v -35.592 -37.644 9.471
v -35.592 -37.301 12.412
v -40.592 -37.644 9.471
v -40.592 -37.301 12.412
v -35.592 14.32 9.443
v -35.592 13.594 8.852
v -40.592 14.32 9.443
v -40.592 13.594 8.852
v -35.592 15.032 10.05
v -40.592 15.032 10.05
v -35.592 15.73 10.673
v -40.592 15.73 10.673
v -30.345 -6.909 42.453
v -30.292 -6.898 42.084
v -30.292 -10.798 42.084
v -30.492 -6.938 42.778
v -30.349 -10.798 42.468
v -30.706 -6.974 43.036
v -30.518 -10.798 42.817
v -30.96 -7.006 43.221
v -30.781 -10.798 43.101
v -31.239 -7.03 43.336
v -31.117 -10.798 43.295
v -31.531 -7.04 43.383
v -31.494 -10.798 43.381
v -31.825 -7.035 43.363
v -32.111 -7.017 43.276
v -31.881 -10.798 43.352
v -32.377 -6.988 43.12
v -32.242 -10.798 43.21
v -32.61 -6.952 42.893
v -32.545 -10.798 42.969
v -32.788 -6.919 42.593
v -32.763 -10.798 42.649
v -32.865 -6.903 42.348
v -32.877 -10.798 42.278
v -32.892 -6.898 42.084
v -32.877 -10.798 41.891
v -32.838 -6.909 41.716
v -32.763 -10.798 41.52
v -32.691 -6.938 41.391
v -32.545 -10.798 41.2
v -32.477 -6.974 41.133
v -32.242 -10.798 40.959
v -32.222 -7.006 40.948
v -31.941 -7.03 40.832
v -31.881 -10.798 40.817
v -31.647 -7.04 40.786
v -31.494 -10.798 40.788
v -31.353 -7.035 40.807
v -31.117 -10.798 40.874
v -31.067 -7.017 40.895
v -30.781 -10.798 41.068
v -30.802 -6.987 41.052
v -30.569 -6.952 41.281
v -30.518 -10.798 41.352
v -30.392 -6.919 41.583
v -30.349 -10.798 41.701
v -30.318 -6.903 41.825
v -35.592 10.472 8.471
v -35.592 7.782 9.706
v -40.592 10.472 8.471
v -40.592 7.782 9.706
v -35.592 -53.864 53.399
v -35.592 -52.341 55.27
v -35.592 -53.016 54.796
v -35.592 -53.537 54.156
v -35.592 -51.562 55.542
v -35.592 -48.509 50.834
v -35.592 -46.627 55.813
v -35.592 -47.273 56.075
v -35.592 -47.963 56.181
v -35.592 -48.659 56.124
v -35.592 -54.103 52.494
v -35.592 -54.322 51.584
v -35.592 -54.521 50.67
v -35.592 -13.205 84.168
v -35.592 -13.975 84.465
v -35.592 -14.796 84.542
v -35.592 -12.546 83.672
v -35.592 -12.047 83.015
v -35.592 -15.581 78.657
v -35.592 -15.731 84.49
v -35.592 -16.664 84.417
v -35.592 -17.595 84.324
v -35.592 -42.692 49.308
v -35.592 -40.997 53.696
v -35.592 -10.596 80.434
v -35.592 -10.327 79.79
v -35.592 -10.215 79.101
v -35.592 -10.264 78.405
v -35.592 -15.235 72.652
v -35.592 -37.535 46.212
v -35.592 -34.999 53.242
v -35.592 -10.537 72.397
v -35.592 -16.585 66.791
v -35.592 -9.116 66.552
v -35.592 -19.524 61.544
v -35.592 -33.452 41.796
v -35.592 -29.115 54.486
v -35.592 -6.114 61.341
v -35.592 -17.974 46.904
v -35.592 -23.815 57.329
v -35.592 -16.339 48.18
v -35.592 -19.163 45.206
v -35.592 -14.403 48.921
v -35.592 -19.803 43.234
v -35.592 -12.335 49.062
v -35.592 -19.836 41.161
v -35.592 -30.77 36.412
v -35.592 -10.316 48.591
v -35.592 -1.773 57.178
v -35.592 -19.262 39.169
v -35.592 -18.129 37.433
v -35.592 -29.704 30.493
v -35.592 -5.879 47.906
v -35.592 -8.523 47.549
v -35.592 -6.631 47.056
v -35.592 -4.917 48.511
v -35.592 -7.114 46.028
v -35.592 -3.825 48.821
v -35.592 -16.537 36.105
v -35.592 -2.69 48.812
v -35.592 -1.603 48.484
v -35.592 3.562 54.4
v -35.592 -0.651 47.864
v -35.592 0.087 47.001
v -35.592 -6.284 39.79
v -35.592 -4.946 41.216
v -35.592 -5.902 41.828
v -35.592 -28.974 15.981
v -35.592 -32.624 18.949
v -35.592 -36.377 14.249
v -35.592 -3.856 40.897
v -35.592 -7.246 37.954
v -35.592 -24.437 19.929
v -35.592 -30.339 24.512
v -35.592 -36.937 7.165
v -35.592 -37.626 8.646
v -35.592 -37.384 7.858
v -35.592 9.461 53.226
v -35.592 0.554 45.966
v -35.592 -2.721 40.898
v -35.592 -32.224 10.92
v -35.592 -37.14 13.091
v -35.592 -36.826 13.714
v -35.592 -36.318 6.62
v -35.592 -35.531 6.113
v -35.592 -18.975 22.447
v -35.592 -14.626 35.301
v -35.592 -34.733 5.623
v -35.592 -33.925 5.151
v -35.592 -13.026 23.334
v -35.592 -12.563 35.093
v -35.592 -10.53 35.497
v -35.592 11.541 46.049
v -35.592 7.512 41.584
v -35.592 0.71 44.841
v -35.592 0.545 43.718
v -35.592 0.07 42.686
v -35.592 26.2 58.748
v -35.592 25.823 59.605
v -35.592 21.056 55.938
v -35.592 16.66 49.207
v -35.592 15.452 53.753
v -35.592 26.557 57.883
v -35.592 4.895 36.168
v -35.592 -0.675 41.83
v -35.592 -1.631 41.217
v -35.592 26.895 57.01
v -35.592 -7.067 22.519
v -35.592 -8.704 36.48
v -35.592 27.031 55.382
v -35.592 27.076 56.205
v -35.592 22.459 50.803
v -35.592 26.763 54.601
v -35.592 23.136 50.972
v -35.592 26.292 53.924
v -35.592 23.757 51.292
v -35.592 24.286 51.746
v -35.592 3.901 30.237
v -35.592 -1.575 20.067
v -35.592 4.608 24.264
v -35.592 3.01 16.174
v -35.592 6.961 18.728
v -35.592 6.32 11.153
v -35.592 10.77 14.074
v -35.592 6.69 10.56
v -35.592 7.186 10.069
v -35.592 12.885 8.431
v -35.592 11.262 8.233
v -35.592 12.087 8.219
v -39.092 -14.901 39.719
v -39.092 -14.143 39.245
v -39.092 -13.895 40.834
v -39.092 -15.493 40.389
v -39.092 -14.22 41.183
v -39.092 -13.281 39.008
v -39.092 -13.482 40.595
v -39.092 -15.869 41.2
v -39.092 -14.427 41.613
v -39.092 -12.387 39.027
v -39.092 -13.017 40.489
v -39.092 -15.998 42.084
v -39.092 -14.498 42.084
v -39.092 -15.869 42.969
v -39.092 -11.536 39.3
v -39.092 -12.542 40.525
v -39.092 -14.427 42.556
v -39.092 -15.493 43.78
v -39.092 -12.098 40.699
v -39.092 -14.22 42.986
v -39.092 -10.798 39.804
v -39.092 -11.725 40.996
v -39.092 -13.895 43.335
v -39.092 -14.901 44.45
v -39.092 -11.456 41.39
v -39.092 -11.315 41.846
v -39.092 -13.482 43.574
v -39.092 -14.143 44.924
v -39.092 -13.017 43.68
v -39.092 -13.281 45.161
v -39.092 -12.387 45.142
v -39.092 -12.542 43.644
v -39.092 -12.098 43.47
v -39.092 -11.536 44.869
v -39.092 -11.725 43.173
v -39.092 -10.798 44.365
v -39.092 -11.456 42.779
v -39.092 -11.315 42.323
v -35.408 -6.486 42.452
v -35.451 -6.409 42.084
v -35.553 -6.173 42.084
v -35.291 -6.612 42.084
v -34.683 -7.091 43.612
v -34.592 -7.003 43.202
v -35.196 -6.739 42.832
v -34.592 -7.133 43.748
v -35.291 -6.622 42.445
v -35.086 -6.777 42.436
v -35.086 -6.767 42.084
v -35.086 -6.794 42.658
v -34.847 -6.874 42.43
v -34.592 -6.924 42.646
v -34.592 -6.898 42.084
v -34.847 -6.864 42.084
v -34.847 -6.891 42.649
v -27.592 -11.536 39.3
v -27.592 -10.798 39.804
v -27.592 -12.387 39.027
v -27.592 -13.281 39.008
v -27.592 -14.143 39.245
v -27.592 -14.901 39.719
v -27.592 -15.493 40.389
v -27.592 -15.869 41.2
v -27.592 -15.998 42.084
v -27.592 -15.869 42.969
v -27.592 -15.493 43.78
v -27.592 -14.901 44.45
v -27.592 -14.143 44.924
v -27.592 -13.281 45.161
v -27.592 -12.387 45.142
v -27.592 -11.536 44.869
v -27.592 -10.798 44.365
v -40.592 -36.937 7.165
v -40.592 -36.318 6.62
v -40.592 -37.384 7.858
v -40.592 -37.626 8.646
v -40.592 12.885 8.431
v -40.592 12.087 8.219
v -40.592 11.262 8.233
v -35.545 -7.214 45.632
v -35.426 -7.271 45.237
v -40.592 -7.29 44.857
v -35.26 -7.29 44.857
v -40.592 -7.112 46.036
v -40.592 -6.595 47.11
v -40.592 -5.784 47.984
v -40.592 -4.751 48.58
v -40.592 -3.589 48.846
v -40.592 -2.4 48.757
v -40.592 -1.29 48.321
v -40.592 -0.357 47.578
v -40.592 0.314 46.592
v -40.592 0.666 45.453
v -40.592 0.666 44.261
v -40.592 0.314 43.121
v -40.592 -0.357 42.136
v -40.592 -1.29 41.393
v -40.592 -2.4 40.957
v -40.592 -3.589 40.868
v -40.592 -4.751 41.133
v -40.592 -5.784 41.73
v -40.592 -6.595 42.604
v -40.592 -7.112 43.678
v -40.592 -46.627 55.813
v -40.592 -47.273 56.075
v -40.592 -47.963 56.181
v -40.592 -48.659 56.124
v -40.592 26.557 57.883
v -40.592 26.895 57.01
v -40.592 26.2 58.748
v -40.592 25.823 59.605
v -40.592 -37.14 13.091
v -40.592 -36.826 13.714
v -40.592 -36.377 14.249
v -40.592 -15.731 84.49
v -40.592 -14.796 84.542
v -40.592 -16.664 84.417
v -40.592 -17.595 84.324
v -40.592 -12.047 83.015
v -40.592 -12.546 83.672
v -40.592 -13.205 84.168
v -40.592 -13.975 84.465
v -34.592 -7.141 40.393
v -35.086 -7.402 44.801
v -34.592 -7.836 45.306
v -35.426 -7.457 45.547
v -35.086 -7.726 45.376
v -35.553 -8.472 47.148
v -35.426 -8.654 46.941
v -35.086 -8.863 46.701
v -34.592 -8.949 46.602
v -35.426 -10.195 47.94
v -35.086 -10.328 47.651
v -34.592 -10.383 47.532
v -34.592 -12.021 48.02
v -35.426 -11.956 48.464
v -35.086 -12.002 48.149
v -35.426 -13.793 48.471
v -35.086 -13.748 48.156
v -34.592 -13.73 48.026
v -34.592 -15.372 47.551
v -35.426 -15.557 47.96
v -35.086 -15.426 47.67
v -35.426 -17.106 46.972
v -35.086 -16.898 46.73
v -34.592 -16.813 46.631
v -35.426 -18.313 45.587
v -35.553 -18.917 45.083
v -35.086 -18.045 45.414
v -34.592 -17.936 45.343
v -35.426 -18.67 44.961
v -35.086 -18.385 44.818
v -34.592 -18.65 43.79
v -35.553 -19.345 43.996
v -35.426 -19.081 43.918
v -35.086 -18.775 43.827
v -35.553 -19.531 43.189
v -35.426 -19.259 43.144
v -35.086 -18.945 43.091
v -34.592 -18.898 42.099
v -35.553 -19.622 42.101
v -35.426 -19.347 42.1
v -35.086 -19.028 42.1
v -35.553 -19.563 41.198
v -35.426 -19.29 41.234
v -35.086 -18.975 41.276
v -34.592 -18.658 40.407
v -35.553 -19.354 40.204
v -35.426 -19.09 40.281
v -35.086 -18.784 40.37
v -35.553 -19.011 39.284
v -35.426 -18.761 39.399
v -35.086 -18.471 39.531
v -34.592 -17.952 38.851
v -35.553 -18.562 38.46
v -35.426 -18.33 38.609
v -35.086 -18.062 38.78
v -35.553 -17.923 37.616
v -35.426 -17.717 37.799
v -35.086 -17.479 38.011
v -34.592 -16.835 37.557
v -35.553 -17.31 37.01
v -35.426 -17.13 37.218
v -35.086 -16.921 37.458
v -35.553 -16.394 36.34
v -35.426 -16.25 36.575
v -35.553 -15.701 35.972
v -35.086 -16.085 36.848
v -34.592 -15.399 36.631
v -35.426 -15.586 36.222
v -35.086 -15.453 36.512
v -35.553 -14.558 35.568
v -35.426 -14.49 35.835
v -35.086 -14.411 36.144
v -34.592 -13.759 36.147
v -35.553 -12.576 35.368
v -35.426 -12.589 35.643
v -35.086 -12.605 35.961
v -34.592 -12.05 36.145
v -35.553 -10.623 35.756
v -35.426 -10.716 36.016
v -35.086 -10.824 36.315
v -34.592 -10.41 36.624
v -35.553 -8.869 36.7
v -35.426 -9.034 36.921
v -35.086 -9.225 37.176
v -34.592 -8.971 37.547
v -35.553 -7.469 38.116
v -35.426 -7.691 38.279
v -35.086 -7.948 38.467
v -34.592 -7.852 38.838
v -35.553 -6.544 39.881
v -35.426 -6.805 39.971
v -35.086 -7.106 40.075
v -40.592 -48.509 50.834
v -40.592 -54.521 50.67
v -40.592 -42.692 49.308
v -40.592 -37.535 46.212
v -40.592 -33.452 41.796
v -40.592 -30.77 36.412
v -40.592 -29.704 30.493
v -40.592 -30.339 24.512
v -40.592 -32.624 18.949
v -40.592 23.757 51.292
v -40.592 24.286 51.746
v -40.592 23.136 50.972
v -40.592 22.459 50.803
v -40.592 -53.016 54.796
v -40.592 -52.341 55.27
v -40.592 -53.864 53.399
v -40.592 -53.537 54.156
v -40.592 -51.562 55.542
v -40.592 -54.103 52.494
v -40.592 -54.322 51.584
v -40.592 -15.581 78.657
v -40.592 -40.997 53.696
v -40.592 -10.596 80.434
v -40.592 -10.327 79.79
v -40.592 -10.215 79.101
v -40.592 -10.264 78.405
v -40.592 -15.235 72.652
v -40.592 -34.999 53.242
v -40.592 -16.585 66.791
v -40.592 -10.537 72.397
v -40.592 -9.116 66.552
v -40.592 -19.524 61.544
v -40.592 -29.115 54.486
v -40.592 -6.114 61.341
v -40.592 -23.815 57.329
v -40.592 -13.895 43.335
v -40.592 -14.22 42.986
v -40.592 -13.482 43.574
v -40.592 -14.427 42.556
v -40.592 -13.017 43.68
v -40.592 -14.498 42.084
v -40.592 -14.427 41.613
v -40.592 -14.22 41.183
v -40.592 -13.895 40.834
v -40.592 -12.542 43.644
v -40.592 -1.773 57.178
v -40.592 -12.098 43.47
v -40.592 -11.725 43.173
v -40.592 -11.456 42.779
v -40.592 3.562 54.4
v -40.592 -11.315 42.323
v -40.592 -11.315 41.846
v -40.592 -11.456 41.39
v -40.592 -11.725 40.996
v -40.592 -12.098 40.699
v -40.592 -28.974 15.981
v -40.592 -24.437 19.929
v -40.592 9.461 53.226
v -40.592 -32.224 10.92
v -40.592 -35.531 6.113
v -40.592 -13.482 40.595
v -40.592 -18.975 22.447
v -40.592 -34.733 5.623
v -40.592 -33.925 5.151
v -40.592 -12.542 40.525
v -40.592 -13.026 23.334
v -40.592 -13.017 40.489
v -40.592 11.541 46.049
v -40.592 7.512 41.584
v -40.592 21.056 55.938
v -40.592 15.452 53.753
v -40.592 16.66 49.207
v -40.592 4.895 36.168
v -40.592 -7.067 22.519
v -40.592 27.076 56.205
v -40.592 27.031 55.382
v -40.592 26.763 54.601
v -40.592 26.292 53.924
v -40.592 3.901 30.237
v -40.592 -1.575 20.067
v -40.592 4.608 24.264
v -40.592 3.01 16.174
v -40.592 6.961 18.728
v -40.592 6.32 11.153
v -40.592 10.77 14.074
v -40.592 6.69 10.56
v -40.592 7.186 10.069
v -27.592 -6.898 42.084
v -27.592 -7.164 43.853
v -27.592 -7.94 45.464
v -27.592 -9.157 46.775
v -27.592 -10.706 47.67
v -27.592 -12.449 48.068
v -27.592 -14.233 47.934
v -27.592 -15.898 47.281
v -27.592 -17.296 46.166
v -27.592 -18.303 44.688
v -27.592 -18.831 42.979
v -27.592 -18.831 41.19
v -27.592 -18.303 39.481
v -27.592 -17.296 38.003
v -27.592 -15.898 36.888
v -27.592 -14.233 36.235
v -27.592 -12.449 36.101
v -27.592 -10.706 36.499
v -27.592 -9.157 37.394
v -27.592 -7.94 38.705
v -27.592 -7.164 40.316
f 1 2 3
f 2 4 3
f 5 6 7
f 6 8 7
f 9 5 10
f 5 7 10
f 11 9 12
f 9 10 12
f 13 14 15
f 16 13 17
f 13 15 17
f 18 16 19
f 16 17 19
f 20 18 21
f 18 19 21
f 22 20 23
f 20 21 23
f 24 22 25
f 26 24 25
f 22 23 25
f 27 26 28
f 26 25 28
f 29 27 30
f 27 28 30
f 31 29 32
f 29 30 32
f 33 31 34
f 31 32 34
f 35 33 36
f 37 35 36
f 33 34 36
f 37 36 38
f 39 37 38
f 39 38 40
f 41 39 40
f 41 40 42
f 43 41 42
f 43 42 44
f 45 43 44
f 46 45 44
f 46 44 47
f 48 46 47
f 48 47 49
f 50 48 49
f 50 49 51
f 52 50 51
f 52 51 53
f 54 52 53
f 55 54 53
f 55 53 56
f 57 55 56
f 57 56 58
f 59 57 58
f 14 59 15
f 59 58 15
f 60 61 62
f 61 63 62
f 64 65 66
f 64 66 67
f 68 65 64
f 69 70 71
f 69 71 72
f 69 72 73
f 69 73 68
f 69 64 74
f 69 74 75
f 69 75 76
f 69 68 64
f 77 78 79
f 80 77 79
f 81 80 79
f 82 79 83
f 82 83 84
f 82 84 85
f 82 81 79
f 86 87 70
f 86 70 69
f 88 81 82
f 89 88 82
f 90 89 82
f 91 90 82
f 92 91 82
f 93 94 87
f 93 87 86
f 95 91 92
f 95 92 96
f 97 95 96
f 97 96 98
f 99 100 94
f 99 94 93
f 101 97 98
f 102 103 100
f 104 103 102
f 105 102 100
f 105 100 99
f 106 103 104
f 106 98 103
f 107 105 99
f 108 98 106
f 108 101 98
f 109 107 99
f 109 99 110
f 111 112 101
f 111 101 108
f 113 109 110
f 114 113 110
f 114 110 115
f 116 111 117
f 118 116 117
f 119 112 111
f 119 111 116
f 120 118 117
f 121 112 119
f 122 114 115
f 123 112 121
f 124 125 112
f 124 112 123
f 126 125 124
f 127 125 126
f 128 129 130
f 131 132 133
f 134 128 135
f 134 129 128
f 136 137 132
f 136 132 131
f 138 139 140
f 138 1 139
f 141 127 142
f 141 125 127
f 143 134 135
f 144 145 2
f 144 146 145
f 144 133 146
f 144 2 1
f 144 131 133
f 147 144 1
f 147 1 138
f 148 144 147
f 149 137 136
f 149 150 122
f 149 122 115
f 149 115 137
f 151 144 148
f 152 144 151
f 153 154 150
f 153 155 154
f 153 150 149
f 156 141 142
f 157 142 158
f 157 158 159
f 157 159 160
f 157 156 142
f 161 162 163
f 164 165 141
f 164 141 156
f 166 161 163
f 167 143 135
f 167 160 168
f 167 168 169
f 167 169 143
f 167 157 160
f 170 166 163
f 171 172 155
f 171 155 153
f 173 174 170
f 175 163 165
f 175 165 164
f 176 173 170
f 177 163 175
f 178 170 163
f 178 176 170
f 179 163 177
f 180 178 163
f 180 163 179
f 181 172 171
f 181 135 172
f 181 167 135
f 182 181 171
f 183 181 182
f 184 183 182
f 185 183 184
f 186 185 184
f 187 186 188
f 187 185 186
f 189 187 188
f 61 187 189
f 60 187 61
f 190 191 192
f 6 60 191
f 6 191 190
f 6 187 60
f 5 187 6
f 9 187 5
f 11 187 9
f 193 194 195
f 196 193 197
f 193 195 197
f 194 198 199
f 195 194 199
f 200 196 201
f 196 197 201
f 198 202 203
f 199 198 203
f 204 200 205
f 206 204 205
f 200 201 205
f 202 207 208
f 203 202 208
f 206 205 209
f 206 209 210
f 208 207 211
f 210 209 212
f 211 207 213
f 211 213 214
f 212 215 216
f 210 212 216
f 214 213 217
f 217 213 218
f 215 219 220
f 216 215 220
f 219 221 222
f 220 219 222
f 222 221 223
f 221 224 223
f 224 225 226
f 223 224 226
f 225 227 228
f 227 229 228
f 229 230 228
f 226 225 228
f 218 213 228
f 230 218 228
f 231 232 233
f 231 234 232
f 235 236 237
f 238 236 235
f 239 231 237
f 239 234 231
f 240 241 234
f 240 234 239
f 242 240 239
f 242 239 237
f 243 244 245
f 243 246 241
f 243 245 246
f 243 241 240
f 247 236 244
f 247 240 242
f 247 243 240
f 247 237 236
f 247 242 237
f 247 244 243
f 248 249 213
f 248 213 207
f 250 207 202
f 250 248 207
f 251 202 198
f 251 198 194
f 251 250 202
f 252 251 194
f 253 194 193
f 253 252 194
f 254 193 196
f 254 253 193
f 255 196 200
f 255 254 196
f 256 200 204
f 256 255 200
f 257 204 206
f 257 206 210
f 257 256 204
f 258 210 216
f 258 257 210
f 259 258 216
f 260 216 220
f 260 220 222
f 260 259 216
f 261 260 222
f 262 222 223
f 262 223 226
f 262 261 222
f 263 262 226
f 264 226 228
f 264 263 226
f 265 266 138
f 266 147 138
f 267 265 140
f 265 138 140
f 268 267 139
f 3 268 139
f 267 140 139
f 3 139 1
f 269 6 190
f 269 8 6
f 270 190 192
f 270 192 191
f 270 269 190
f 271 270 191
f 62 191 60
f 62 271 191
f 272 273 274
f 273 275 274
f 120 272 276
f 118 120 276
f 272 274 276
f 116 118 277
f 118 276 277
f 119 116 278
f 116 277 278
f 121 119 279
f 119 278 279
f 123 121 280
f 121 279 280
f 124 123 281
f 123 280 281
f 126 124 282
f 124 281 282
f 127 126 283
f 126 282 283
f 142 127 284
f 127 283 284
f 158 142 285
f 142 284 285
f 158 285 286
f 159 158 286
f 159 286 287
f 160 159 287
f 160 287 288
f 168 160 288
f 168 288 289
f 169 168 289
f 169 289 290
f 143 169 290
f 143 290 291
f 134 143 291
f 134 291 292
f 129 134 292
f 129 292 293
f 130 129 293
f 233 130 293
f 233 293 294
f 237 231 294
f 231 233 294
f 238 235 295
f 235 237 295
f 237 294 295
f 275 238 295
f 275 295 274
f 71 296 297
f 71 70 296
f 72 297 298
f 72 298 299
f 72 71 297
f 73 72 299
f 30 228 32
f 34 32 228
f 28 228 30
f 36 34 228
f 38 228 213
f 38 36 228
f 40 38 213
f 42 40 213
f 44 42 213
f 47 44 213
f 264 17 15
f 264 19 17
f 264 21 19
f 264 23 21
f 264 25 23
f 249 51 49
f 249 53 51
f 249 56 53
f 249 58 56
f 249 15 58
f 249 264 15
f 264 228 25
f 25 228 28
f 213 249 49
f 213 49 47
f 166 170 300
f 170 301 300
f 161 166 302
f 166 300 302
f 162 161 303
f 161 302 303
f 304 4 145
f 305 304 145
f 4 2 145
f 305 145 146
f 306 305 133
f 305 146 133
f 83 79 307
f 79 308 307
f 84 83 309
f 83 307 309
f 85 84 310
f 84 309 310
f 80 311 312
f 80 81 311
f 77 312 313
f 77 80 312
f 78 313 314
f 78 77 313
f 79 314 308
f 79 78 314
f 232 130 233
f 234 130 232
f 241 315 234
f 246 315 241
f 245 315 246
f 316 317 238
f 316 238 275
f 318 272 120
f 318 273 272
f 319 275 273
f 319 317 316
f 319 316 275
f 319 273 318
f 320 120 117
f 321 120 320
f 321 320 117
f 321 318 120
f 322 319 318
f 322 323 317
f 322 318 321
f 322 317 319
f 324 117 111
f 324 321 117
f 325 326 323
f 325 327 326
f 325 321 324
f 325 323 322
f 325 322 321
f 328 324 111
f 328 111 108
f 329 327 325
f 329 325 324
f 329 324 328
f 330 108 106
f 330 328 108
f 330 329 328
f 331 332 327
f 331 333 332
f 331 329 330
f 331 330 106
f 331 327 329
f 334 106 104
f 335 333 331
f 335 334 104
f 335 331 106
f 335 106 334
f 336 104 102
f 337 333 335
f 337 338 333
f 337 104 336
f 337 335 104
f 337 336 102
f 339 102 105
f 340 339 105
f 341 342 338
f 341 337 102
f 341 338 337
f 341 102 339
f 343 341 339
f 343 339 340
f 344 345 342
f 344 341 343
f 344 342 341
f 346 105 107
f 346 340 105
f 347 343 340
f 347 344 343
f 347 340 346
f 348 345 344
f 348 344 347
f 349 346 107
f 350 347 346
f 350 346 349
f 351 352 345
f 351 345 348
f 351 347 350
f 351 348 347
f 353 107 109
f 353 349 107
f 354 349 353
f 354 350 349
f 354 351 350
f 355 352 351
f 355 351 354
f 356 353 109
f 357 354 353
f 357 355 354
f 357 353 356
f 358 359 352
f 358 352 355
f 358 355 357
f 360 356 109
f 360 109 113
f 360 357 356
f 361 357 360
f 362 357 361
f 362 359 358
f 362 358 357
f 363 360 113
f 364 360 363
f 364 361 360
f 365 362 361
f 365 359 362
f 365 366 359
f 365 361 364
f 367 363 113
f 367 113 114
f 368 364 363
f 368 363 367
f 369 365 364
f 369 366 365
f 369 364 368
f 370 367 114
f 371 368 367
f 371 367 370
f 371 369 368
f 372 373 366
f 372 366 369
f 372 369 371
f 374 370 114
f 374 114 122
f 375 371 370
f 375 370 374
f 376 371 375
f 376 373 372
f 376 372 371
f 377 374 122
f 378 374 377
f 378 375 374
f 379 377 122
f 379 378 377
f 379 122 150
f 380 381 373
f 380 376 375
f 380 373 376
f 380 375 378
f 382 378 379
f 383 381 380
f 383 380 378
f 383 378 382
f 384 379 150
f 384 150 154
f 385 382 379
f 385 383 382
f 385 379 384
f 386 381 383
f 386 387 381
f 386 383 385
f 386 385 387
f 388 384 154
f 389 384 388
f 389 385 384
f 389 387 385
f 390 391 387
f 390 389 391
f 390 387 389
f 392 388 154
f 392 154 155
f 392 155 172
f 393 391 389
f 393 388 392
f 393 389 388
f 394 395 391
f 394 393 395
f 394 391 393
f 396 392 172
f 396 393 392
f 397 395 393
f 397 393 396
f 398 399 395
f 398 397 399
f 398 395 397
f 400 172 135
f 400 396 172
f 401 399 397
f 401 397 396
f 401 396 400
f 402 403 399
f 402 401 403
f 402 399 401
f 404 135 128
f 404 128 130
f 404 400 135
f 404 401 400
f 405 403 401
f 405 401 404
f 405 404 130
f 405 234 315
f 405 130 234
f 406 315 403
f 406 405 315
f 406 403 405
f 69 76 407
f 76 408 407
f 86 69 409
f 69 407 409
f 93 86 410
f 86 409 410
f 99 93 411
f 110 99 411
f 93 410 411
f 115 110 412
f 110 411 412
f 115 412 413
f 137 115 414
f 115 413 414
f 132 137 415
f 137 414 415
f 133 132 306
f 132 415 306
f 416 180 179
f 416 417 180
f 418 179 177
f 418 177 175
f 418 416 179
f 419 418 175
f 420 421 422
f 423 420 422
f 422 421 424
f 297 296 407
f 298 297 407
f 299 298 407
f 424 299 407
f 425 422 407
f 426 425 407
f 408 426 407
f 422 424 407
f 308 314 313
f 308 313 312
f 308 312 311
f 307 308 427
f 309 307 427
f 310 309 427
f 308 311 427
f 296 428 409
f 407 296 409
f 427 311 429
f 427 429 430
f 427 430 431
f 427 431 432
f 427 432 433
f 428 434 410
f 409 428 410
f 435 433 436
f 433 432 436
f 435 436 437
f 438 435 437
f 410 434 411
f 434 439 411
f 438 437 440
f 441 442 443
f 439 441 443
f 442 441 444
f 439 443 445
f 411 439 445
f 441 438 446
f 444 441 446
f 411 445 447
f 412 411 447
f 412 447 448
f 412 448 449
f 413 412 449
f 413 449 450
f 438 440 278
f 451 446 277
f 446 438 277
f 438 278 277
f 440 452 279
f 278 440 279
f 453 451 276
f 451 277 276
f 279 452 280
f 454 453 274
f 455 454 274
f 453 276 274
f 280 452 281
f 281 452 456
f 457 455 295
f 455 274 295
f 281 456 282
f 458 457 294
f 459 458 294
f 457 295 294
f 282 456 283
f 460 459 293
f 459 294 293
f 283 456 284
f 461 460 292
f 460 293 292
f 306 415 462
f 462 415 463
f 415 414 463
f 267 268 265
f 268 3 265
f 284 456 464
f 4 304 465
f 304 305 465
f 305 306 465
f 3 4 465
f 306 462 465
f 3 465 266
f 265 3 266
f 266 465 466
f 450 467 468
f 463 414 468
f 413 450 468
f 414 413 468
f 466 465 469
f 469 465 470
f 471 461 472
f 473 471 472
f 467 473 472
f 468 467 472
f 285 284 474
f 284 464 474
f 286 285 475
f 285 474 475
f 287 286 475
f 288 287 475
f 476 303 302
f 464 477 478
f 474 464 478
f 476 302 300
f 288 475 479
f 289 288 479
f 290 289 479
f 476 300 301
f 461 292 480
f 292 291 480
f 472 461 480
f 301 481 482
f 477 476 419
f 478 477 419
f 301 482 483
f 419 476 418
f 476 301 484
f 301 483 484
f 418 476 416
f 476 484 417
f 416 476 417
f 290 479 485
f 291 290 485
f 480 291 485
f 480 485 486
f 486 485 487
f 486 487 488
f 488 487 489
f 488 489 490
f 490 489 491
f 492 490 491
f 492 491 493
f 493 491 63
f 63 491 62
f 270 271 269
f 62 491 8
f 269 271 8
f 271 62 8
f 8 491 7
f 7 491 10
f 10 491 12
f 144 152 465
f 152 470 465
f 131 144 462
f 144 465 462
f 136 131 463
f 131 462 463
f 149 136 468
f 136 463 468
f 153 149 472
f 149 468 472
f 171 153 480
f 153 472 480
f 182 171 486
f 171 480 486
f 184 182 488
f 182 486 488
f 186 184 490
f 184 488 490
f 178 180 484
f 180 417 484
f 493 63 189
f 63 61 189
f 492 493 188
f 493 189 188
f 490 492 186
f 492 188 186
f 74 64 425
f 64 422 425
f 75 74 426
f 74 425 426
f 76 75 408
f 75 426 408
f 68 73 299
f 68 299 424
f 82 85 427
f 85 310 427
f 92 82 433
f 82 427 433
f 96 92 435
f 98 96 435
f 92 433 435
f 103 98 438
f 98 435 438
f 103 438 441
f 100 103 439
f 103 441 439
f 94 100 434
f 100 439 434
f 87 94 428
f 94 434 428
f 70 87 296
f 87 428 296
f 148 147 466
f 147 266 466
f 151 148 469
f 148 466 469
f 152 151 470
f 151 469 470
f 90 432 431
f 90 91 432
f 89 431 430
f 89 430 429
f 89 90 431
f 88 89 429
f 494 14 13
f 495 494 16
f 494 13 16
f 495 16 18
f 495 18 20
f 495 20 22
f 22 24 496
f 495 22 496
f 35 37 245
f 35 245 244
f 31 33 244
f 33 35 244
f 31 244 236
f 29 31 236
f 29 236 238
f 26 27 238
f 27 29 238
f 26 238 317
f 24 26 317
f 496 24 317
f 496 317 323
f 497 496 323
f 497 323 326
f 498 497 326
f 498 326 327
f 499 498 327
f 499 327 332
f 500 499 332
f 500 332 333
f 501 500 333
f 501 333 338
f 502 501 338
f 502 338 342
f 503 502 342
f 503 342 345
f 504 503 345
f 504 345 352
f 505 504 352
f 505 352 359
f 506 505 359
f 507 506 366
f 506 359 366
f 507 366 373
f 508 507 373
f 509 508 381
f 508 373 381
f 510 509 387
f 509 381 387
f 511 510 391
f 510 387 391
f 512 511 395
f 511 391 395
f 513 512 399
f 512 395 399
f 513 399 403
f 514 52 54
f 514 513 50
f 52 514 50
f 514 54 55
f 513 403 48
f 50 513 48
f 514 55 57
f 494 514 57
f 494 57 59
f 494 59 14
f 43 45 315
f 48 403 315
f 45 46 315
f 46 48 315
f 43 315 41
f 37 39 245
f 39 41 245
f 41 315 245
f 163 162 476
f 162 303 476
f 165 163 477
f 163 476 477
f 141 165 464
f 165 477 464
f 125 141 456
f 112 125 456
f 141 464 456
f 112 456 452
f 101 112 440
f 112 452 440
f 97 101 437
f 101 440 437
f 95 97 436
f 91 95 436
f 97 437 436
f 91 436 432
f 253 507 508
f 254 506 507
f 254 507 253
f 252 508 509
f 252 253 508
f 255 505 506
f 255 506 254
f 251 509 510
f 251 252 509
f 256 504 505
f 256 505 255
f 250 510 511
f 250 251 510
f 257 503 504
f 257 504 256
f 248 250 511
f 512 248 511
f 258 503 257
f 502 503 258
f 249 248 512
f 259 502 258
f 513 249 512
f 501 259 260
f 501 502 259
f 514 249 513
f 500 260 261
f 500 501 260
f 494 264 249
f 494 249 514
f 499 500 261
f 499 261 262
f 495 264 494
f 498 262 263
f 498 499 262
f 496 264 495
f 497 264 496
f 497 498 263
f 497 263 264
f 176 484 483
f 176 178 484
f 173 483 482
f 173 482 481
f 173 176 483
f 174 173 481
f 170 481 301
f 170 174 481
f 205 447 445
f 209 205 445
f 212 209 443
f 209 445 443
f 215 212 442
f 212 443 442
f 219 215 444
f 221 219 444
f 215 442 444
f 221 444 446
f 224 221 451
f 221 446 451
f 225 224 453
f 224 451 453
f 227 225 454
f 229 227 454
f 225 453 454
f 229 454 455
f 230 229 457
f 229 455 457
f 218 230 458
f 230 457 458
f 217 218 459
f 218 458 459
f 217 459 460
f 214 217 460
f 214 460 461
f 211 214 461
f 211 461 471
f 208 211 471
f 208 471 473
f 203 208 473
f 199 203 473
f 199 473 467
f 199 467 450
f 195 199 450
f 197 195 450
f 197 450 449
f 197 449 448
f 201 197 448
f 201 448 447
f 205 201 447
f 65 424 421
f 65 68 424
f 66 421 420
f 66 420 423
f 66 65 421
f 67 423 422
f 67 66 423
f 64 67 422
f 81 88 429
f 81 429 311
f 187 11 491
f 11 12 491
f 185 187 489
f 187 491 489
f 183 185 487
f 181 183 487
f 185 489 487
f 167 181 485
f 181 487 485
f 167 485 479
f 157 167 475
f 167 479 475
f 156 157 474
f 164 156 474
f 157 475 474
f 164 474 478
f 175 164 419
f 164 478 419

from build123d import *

# Parameters (mm, degrees)
EXTRUDE_2_DEPTH     = 2.5
SKETCH_4_R          = 6
EXTRUDE_3_DEPTH     = 8
CUT_EXTRUDE_5_DEPTH = 11.5
SKETCH_14_R         = 1.6
CUT_EXTRUDE_6_DEPTH = 12
SKETCH_15_R         = 1.3
CUT_EXTRUDE_7_DEPTH = 11
FILLET_7_R          = 1
FILLET1_R           = 3
SKETCH1_R           = 4
CUT_EXTRUDE2_DEPTH  = 50


with BuildPart() as part:
    # 草图2 → 凸台-拉伸2 (new, symmetric)
    with BuildSketch(Plane.ZY.offset(38.091621509)):
        with BuildLine():
            Line((55.24762265, 27.512579341), (50.911357014, 23.516558631))
            ThreePointArc((50.911357014, 23.516558631), (33.760797652, 4.281653093), (10.672961639, 15.730456776))
            ThreePointArc((10.672961639, 15.730456776), (9.146547949, 13.960204765), (7.719768364, 12.108710517))
            Line((7.719768364, 12.108710517), (10.180230126, 6.749838518))
            ThreePointArc((10.180230126, 6.749838518), (23.173898072, -15.505225418), (5.150905034, -33.925187402))
            ThreePointArc((5.150905034, -33.925187402), (6.362826974, -35.923931044), (7.682803504, -37.853022253))
            Line((7.682803504, -37.853022253), (13.539718137, -37.16896658))
            ThreePointArc((13.539718137, -37.16896658), (38.720805929, -31.688446976), (50.669819665, -54.521413236))
            ThreePointArc((50.669819665, -54.521413236), (52.945242306, -53.986452731), (55.187812251, -53.327202418))
            Line((55.187812251, -53.327202418), (56.347122801, -47.545560763))
            ThreePointArc((56.347122801, -47.545560763), (58.916222984, -21.903349436), (84.324112643, -17.594936665))
            ThreePointArc((84.324112643, -17.594936665), (84.518479234, -15.265569248), (84.584487152, -12.929038938))
            Line((84.584487152, -12.929038938), (79.444065843, -10.039843558))
            ThreePointArc((79.444065843, -10.039843558), (55.850769285, 0.327394986), (59.60469494, 25.823106776))
            ThreePointArc((59.60469494, 25.823106776), (57.449397458, 26.727774506), (55.24762265, 27.512579341))
        make_face()
    extrude(amount=EXTRUDE_2_DEPTH, both=True)

    # 草图4 → 凸台-拉伸3 (add)
    with BuildSketch(Plane(origin=(-35.591621509, 0, 0), x_dir=(0, 0, -1), z_dir=(1, 0, 0))):
        with Locations((-42.084498784, -12.89759475)):
            Circle(SKETCH_4_R)
    extrude(amount=EXTRUDE_3_DEPTH)

    # 草图13 → 切除-拉伸5 (cut)
    with BuildSketch(Plane(origin=(-27.591621509, 0, 0), x_dir=(0, 0, -1), z_dir=(1, 0, 0))):
        with BuildLine():
            Line((-44.364849634, -10.79759475), (-39.804147934, -10.79759475))
            ThreePointArc((-39.804147934, -10.79759475), (-42.084498784, -15.99759475), (-44.364849634, -10.79759475))
        make_face()
    extrude(amount=-CUT_EXTRUDE_5_DEPTH, mode=Mode.SUBTRACT)

    # 草图14 → 切除-拉伸6 (cut)
    with BuildSketch(Plane.ZY.offset(40.591621509)):
        with Locations((42.084498784, -12.89759475)):
            Circle(SKETCH_14_R)
    extrude(amount=-CUT_EXTRUDE_6_DEPTH, mode=Mode.SUBTRACT)

    # 草图15 → 切除-拉伸7 (cut)
    with BuildSketch(Plane.XZ.offset(10.79759475)):
        with Locations((-31.591621509, 42.084498784)):
            Circle(SKETCH_15_R)
    extrude(amount=-CUT_EXTRUDE_7_DEPTH, mode=Mode.SUBTRACT)

    # 圆角7
    fillet_7_edges = [part.edges().sort_by_distance(p)[0] for p in [
        (-35.591621509, -12.89759475, 48.084498784),
    ]]
    fillet(fillet_7_edges, radius=FILLET_7_R)

    # Fillet1
    fillet1_edges = [part.edges().sort_by_distance(p)[0] for p in [
        (-38.091621509, -47.545560763, 56.347122801),
        (-38.091621509, -53.327202418, 55.187812251),
        (-38.091621509, -37.853022253, 7.682803504),
        (-38.091621509, -37.16896658, 13.539718137),
        (-38.091621509, 6.749838518, 10.180230126),
        (-38.091621509, 12.108710517, 7.719768364),
        (-38.091621509, -12.929038938, 84.584487152),
        (-38.091621509, -10.039843558, 79.444065843),
        (-38.091621509, 27.512579341, 55.24762265),
        (-38.091621509, 23.516558631, 50.911357014),
    ]]
    fillet(fillet1_edges, radius=FILLET1_R)

    # Sketch1 → Cut-Extrude2 (cut)
    with BuildSketch(Plane.ZY.offset(40.591621509)):
        with Locations((44.856906438, -3.289589973)):
            Circle(SKETCH1_R)
    extrude(amount=-CUT_EXTRUDE2_DEPTH, mode=Mode.SUBTRACT)


solid = part.part
